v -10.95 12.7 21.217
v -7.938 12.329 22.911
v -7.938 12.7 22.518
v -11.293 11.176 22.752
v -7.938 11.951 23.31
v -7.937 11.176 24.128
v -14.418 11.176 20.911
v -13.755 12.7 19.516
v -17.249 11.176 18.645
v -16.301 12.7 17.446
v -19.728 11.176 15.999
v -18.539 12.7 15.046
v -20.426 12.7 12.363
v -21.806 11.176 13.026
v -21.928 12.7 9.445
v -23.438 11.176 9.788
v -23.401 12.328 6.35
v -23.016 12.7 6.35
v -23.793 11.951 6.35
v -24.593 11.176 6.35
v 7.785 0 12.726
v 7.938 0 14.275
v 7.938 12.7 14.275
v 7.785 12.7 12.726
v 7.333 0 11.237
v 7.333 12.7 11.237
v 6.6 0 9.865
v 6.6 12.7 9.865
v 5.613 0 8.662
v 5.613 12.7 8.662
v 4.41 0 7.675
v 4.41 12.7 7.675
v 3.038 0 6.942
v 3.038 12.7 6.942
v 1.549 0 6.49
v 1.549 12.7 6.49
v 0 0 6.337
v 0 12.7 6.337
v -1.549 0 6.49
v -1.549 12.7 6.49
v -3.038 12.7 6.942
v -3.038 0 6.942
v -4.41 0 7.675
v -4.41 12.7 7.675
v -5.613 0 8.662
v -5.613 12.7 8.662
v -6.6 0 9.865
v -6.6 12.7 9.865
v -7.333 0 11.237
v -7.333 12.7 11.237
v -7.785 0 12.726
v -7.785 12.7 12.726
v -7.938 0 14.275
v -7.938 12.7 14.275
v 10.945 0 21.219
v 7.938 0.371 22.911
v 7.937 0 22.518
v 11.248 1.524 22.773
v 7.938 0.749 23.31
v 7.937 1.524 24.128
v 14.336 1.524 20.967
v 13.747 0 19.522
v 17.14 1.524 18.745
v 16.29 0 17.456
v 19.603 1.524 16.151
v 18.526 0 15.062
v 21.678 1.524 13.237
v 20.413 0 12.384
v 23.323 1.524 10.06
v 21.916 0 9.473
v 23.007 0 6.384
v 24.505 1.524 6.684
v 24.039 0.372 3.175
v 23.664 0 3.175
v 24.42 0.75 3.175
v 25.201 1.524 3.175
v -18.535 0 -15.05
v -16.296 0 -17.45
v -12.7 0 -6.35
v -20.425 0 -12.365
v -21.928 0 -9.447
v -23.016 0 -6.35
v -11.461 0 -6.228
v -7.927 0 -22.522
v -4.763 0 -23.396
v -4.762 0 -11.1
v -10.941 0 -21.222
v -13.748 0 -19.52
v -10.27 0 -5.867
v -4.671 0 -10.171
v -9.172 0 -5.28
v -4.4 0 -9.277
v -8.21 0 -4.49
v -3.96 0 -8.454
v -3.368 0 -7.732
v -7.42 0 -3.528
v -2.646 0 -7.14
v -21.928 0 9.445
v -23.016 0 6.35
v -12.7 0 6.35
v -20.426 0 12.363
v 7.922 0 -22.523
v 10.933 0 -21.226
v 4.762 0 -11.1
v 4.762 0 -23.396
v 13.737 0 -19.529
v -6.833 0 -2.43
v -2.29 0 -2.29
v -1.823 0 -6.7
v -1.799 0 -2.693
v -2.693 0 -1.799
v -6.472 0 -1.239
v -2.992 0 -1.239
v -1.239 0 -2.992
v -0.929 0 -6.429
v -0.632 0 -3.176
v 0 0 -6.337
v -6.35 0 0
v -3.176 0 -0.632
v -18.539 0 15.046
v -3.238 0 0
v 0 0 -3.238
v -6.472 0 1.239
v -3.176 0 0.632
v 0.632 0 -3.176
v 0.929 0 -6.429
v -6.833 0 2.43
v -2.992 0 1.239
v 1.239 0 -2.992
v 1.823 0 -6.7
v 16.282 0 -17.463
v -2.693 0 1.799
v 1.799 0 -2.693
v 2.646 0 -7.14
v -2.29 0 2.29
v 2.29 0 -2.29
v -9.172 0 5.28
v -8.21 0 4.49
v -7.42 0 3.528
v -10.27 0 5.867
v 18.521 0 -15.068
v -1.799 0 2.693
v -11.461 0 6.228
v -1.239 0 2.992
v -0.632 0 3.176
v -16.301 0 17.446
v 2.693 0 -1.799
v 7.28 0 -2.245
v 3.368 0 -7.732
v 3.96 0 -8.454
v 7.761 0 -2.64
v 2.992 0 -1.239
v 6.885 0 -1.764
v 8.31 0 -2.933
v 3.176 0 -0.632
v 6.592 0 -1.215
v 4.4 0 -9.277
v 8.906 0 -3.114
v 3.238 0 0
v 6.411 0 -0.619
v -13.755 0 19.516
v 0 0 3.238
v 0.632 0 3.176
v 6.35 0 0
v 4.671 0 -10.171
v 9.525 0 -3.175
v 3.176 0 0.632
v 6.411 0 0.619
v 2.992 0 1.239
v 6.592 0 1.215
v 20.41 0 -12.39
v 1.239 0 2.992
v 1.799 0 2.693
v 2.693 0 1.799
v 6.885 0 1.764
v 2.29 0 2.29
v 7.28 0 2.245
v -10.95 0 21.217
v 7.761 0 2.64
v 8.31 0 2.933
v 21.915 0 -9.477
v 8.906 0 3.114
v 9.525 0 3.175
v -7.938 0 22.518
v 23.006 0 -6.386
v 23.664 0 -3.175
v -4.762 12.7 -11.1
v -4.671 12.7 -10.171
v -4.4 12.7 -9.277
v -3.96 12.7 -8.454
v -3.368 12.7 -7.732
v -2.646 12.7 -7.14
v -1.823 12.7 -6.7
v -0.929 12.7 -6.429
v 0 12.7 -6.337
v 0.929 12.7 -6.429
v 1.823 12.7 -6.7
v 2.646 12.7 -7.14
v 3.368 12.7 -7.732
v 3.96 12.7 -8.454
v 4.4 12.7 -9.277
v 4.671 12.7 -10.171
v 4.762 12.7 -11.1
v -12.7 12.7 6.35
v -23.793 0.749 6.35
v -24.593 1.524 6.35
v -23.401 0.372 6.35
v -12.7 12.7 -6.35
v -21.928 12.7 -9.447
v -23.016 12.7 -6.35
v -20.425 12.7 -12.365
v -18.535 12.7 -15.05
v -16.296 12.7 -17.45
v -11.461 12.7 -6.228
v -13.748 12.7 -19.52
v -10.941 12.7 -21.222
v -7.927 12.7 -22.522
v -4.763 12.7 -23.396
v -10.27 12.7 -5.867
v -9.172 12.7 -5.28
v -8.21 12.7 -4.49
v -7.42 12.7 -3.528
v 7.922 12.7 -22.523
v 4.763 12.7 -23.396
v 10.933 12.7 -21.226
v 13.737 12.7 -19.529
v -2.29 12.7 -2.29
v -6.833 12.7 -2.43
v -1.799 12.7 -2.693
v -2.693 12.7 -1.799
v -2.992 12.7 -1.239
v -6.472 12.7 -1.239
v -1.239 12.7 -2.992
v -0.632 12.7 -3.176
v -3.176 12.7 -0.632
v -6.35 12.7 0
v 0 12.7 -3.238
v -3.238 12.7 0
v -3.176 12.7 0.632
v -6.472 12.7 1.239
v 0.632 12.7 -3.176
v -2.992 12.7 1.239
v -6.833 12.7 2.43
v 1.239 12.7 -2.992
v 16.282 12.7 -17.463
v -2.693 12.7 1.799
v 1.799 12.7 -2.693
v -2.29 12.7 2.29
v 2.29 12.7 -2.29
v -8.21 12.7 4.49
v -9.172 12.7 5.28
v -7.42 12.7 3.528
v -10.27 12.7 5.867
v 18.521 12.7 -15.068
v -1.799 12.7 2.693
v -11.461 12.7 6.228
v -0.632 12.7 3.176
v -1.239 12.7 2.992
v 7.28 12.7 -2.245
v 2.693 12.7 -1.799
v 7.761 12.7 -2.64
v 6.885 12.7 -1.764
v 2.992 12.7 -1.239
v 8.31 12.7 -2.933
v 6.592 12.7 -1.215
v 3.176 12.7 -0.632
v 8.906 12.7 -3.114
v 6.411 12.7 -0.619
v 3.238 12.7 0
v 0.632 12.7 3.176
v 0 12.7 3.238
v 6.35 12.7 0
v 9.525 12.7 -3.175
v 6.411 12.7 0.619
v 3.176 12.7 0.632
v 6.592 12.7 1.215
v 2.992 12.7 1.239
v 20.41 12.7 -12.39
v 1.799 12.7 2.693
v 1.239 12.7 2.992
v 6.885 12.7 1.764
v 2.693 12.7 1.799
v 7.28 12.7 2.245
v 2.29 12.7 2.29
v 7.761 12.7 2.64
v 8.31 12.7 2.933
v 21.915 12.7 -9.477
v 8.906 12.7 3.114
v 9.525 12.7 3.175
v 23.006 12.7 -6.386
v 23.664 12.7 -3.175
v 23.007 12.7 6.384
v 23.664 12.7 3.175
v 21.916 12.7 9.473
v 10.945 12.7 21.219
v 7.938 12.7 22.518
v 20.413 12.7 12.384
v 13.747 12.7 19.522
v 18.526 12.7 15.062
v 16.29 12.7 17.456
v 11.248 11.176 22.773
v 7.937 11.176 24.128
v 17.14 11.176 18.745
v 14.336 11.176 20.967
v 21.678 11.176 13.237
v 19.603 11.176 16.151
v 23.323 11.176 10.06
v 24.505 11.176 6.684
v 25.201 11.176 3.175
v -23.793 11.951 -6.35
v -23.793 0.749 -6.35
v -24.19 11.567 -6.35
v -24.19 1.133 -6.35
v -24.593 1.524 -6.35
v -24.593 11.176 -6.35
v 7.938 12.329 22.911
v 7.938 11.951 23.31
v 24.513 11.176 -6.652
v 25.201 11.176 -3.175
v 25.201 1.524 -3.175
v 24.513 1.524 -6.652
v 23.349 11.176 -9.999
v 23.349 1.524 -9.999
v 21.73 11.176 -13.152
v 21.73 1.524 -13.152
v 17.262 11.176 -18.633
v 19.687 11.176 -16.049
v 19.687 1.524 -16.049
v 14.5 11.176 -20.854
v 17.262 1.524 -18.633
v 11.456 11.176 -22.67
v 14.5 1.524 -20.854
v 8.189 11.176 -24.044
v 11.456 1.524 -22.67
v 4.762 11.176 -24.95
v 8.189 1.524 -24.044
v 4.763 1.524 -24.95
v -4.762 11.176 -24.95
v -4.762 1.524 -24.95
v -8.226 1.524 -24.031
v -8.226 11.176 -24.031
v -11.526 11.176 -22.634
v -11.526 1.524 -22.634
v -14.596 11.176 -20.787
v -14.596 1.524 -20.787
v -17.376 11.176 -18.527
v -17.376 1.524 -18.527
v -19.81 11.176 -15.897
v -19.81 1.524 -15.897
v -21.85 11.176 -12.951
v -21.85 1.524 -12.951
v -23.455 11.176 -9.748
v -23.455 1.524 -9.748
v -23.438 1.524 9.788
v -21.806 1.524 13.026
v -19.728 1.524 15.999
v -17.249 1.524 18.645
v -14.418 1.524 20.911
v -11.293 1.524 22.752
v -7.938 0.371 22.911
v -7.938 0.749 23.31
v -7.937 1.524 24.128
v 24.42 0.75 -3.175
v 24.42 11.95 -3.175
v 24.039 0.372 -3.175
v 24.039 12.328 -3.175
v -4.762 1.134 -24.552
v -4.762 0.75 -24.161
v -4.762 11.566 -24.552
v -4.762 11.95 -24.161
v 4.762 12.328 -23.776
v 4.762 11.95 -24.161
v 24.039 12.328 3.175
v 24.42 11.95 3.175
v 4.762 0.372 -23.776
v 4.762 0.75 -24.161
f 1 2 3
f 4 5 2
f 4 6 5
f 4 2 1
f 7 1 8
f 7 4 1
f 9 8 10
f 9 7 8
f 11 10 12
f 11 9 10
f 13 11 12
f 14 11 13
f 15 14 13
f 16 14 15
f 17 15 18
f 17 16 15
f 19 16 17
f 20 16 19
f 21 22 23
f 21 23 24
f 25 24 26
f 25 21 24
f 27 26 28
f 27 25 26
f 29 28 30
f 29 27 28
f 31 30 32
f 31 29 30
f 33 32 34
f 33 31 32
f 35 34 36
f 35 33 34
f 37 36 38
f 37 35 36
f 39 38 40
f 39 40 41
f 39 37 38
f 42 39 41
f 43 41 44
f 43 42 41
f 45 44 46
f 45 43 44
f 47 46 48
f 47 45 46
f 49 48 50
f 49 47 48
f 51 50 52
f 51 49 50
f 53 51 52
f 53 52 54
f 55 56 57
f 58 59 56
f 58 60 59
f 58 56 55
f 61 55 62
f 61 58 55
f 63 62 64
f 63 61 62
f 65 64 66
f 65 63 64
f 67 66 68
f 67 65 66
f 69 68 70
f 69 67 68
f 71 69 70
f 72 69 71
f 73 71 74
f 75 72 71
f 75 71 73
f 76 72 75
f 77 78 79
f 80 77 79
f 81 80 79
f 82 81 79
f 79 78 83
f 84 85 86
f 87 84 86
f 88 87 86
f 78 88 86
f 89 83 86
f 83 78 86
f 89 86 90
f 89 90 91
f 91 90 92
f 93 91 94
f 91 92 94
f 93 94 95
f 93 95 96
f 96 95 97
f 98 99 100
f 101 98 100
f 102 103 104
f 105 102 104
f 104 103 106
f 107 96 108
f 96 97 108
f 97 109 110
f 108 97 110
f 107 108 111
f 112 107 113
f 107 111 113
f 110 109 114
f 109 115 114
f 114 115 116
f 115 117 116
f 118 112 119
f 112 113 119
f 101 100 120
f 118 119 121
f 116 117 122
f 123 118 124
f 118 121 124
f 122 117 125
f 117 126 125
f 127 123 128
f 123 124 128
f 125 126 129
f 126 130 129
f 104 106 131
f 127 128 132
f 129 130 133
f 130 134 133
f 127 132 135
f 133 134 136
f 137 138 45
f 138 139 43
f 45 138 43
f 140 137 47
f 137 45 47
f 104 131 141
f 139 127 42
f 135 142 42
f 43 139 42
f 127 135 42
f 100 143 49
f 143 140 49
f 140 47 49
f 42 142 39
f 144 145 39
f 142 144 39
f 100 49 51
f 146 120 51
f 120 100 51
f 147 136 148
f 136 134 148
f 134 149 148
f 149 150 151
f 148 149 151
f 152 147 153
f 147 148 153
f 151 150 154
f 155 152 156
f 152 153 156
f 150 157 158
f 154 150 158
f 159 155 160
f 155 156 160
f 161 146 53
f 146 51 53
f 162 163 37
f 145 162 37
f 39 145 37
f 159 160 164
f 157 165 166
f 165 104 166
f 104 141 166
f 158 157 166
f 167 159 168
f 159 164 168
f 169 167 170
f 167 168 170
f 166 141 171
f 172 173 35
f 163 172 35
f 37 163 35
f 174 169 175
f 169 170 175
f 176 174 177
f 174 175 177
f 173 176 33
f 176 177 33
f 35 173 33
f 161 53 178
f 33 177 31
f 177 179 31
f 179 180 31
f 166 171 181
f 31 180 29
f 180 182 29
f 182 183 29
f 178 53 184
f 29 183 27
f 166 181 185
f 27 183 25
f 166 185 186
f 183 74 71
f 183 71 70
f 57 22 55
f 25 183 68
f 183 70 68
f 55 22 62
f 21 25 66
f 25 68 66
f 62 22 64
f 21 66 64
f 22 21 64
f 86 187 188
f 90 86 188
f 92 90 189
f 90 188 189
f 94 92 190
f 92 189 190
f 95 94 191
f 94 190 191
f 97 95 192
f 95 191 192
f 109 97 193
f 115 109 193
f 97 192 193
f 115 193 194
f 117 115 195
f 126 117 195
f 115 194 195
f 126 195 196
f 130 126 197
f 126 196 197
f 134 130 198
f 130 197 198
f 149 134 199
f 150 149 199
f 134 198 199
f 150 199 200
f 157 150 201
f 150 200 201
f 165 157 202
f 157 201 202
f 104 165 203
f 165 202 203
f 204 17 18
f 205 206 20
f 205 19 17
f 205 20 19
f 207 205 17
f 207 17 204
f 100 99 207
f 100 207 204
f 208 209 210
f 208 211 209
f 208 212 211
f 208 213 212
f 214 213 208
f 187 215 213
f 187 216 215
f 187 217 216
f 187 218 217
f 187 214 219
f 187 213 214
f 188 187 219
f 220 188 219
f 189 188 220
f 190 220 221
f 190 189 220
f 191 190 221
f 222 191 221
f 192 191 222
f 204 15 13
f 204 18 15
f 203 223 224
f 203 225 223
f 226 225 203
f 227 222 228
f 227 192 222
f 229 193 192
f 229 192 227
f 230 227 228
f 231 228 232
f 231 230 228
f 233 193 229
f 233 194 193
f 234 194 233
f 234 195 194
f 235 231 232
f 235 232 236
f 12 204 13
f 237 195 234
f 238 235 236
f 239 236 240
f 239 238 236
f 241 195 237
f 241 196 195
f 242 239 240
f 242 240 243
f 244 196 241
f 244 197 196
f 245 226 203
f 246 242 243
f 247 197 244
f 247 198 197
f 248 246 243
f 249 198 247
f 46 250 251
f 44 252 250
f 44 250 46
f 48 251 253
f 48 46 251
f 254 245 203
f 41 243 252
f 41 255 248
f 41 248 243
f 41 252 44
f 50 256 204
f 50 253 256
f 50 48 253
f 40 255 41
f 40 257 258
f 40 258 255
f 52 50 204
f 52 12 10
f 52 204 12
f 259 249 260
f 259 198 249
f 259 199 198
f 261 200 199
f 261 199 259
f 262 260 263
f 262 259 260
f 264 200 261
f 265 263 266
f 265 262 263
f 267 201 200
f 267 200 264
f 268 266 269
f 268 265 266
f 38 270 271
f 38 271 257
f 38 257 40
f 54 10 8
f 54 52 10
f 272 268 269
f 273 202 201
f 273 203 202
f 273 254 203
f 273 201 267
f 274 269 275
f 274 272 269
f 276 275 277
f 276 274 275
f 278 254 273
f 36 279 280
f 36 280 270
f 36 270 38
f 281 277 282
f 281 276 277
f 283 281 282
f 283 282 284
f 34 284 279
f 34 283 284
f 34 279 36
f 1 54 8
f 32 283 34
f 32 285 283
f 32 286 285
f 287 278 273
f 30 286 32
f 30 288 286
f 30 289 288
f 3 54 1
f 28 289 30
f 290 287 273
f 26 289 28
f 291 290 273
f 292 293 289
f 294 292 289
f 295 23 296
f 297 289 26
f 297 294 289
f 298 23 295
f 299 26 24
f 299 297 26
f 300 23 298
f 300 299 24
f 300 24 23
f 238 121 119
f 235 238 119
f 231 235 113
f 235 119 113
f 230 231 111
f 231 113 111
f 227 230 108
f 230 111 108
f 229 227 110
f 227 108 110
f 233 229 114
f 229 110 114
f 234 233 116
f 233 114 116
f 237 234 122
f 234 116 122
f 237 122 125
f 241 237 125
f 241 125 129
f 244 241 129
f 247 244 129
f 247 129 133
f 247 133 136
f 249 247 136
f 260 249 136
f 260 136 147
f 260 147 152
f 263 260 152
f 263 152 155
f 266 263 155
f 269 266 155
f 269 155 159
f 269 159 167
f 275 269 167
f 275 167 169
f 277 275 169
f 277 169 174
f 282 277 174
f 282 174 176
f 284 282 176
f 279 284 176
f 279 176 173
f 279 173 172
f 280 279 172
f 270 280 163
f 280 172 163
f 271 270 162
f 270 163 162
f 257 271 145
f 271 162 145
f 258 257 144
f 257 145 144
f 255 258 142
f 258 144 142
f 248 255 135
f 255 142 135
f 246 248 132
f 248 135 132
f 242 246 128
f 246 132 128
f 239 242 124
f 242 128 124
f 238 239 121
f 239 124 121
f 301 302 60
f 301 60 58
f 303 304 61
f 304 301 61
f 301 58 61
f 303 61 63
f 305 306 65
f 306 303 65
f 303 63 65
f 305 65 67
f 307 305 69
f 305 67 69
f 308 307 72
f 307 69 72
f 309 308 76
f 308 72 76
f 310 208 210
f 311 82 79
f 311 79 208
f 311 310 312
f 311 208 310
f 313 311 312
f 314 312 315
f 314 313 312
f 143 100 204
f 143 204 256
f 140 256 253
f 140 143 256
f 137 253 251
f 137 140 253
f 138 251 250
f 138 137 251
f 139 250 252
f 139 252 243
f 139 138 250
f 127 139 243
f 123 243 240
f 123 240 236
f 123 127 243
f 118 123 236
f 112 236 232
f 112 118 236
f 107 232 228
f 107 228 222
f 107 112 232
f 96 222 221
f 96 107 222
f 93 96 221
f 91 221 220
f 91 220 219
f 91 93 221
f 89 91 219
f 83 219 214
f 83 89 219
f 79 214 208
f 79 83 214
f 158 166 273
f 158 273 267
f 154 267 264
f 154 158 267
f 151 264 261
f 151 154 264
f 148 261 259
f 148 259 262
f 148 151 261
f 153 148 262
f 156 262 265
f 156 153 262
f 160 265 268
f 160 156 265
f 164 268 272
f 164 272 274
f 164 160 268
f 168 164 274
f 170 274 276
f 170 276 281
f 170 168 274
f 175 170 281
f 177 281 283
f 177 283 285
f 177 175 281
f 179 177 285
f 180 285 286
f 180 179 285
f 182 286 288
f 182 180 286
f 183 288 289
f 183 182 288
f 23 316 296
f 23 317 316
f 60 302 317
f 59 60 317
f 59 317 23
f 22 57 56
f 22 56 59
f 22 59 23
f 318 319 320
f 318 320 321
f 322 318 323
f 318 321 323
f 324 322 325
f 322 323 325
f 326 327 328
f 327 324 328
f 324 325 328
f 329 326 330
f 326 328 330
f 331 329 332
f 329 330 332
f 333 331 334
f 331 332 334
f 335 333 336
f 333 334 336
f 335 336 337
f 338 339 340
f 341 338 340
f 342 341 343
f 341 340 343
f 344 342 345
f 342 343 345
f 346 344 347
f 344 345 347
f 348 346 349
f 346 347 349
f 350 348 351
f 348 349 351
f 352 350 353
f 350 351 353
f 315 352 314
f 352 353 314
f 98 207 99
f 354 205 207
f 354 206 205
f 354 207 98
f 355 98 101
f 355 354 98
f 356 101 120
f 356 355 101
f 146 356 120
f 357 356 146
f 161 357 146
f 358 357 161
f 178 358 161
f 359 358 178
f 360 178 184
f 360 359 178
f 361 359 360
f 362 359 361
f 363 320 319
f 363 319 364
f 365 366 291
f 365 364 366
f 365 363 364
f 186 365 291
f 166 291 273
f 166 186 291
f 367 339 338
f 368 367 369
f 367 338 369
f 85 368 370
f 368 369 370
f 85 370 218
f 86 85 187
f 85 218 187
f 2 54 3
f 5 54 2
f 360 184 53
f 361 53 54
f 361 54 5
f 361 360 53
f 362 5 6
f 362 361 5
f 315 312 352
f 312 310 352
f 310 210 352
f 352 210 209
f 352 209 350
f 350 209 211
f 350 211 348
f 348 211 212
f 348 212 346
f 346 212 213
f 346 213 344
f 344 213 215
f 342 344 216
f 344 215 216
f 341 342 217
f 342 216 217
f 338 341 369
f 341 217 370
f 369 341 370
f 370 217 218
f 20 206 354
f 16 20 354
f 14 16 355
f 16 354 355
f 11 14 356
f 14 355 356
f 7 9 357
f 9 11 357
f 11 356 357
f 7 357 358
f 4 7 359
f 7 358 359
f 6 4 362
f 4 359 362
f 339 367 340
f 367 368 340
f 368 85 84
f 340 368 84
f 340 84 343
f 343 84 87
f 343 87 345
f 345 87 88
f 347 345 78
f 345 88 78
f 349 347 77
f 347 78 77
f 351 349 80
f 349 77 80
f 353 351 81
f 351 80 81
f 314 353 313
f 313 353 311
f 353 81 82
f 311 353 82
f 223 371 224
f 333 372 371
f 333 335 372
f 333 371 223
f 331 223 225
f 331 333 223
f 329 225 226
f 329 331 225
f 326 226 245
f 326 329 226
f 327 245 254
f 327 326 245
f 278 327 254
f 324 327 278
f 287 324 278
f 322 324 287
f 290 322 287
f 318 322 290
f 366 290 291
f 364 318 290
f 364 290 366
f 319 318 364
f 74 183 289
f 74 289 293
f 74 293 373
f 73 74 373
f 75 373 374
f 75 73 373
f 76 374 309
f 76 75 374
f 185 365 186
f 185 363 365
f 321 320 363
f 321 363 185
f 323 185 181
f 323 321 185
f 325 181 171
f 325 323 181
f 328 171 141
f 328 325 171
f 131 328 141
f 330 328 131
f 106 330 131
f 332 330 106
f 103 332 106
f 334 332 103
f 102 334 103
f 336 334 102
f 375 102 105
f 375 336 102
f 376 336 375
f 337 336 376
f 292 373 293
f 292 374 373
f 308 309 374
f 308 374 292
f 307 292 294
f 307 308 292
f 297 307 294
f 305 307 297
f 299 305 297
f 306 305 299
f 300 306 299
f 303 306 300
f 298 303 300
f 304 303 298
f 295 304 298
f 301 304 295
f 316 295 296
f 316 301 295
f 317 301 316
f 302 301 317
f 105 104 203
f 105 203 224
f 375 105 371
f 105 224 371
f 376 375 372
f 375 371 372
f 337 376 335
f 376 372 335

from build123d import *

# Parameters (mm, degrees)
SKETCH1_R           = 25.4
BOSS_EXTRUDE1_DEPTH = 12.7
HOLE1_D             = 6.477
CUT_EXTRUDE4_DEPTH  = 39.1
CIRPATTERN1_DEPTH   = 12.7
CHAMFER1_SIZE       = 1.524


# Read off the part's stored shape, not the designer's step: CirPattern1
with BuildPart() as part:
    # Sketch1 → Boss-Extrude1 (new body)
    with BuildSketch(Plane(origin=(0, 0, 0), x_dir=(1, 0, 0), z_dir=(0, 1, 0))):
        with Locations(Location((0, 0, 0), (0, 0, 270))):
            Circle(SKETCH1_R)
    extrude(amount=BOSS_EXTRUDE1_DEPTH)

    # Hole1 (through all)
    with Locations(Plane(origin=(0, 12.7, 0), x_dir=(1, 0, 0), z_dir=(0, 1, 0))):
        with Locations((0, 0)):
            Hole(HOLE1_D / 2)

    # Sketch4 → Cut-Extrude4 (cut, symmetric)
    with BuildSketch(Plane(origin=(0, 12.7, 0), x_dir=(1, 0, 0), z_dir=(0, 1, 0))):
        with BuildLine():
            Line((-4.7625, 152.335221274), (-4.7625, 24.949520912))
            Line((-4.7625, 24.949520912), (-4.7625, 11.0998))
            ThreePointArc((-4.7625, 11.0998), (0, 6.3373), (4.7625, 11.0998))
            Line((4.7625, 11.0998), (4.7625, 24.949520912))
            Line((4.7625, 24.949520912), (4.7625, 152.335221274))
            Line((4.7625, 152.335221274), (4.7625, 407.106621997))
            Line((4.7625, 407.106621997), (-4.7625, 407.106621997))
            Line((-4.7625, 407.106621997), (-4.7625, 152.335221274))
        make_face()
    extrude(amount=CUT_EXTRUDE4_DEPTH, both=True, mode=Mode.SUBTRACT)

    # CirPattern1 outline → CirPattern1 (cut)
    with BuildSketch(Plane(origin=(0, 0, 0), x_dir=(1, 0, 0), z_dir=(0, 1, 0))):
        with BuildLine():
            ThreePointArc((-24.593444248, 6.35), (-25.4, 0), (-24.593444248, -6.35))
            Line((-24.593444248, -6.35), (-12.7, -6.35))
            ThreePointArc((-12.7, -6.35), (-6.35, 0), (-12.7, 6.35))
            Line((-12.7, 6.35), (-24.593444248, 6.35))
        make_face()
        with BuildLine():
            Line((9.525, -3.175), (25.200781238, -3.175))
            ThreePointArc((25.200781238, -3.175), (25.4, 0), (25.200781238, 3.175))
            Line((25.200781238, 3.175), (9.525, 3.175))
            ThreePointArc((9.525, 3.175), (6.35, 0), (9.525, -3.175))
        make_face()
        with BuildLine():
            Line((-7.9375, -14.2748), (-7.9375, -24.127911094))
            ThreePointArc((-7.9375, -24.127911094), (0, -25.4), (7.9375, -24.127911094))
            Line((7.9375, -24.127911094), (7.9375, -14.2748))
            ThreePointArc((7.9375, -14.2748), (0, -6.3373), (-7.9375, -14.2748))
        make_face()
    extrude(amount=CIRPATTERN1_DEPTH, mode=Mode.SUBTRACT)

    # Chamfer1
    chamfer1_edges = [part.edges().sort_by_distance(p)[0] for p in [
        (-17.37608731, 0, -18.526510459),
        (-17.37608731, 12.7, -18.526510459),
        (-18.535887196, 0, 17.366084356),
        (-18.535887196, 12.7, 17.366084356),
        (19.603380874, 0, 16.151391839),
        (19.603380874, 12.7, 16.151391839),
        (18.519773105, 0, -17.383267936),
        (18.519773105, 12.7, -17.383267936),
    ]]
    chamfer(chamfer1_edges, length=CHAMFER1_SIZE)


solid = part.part
